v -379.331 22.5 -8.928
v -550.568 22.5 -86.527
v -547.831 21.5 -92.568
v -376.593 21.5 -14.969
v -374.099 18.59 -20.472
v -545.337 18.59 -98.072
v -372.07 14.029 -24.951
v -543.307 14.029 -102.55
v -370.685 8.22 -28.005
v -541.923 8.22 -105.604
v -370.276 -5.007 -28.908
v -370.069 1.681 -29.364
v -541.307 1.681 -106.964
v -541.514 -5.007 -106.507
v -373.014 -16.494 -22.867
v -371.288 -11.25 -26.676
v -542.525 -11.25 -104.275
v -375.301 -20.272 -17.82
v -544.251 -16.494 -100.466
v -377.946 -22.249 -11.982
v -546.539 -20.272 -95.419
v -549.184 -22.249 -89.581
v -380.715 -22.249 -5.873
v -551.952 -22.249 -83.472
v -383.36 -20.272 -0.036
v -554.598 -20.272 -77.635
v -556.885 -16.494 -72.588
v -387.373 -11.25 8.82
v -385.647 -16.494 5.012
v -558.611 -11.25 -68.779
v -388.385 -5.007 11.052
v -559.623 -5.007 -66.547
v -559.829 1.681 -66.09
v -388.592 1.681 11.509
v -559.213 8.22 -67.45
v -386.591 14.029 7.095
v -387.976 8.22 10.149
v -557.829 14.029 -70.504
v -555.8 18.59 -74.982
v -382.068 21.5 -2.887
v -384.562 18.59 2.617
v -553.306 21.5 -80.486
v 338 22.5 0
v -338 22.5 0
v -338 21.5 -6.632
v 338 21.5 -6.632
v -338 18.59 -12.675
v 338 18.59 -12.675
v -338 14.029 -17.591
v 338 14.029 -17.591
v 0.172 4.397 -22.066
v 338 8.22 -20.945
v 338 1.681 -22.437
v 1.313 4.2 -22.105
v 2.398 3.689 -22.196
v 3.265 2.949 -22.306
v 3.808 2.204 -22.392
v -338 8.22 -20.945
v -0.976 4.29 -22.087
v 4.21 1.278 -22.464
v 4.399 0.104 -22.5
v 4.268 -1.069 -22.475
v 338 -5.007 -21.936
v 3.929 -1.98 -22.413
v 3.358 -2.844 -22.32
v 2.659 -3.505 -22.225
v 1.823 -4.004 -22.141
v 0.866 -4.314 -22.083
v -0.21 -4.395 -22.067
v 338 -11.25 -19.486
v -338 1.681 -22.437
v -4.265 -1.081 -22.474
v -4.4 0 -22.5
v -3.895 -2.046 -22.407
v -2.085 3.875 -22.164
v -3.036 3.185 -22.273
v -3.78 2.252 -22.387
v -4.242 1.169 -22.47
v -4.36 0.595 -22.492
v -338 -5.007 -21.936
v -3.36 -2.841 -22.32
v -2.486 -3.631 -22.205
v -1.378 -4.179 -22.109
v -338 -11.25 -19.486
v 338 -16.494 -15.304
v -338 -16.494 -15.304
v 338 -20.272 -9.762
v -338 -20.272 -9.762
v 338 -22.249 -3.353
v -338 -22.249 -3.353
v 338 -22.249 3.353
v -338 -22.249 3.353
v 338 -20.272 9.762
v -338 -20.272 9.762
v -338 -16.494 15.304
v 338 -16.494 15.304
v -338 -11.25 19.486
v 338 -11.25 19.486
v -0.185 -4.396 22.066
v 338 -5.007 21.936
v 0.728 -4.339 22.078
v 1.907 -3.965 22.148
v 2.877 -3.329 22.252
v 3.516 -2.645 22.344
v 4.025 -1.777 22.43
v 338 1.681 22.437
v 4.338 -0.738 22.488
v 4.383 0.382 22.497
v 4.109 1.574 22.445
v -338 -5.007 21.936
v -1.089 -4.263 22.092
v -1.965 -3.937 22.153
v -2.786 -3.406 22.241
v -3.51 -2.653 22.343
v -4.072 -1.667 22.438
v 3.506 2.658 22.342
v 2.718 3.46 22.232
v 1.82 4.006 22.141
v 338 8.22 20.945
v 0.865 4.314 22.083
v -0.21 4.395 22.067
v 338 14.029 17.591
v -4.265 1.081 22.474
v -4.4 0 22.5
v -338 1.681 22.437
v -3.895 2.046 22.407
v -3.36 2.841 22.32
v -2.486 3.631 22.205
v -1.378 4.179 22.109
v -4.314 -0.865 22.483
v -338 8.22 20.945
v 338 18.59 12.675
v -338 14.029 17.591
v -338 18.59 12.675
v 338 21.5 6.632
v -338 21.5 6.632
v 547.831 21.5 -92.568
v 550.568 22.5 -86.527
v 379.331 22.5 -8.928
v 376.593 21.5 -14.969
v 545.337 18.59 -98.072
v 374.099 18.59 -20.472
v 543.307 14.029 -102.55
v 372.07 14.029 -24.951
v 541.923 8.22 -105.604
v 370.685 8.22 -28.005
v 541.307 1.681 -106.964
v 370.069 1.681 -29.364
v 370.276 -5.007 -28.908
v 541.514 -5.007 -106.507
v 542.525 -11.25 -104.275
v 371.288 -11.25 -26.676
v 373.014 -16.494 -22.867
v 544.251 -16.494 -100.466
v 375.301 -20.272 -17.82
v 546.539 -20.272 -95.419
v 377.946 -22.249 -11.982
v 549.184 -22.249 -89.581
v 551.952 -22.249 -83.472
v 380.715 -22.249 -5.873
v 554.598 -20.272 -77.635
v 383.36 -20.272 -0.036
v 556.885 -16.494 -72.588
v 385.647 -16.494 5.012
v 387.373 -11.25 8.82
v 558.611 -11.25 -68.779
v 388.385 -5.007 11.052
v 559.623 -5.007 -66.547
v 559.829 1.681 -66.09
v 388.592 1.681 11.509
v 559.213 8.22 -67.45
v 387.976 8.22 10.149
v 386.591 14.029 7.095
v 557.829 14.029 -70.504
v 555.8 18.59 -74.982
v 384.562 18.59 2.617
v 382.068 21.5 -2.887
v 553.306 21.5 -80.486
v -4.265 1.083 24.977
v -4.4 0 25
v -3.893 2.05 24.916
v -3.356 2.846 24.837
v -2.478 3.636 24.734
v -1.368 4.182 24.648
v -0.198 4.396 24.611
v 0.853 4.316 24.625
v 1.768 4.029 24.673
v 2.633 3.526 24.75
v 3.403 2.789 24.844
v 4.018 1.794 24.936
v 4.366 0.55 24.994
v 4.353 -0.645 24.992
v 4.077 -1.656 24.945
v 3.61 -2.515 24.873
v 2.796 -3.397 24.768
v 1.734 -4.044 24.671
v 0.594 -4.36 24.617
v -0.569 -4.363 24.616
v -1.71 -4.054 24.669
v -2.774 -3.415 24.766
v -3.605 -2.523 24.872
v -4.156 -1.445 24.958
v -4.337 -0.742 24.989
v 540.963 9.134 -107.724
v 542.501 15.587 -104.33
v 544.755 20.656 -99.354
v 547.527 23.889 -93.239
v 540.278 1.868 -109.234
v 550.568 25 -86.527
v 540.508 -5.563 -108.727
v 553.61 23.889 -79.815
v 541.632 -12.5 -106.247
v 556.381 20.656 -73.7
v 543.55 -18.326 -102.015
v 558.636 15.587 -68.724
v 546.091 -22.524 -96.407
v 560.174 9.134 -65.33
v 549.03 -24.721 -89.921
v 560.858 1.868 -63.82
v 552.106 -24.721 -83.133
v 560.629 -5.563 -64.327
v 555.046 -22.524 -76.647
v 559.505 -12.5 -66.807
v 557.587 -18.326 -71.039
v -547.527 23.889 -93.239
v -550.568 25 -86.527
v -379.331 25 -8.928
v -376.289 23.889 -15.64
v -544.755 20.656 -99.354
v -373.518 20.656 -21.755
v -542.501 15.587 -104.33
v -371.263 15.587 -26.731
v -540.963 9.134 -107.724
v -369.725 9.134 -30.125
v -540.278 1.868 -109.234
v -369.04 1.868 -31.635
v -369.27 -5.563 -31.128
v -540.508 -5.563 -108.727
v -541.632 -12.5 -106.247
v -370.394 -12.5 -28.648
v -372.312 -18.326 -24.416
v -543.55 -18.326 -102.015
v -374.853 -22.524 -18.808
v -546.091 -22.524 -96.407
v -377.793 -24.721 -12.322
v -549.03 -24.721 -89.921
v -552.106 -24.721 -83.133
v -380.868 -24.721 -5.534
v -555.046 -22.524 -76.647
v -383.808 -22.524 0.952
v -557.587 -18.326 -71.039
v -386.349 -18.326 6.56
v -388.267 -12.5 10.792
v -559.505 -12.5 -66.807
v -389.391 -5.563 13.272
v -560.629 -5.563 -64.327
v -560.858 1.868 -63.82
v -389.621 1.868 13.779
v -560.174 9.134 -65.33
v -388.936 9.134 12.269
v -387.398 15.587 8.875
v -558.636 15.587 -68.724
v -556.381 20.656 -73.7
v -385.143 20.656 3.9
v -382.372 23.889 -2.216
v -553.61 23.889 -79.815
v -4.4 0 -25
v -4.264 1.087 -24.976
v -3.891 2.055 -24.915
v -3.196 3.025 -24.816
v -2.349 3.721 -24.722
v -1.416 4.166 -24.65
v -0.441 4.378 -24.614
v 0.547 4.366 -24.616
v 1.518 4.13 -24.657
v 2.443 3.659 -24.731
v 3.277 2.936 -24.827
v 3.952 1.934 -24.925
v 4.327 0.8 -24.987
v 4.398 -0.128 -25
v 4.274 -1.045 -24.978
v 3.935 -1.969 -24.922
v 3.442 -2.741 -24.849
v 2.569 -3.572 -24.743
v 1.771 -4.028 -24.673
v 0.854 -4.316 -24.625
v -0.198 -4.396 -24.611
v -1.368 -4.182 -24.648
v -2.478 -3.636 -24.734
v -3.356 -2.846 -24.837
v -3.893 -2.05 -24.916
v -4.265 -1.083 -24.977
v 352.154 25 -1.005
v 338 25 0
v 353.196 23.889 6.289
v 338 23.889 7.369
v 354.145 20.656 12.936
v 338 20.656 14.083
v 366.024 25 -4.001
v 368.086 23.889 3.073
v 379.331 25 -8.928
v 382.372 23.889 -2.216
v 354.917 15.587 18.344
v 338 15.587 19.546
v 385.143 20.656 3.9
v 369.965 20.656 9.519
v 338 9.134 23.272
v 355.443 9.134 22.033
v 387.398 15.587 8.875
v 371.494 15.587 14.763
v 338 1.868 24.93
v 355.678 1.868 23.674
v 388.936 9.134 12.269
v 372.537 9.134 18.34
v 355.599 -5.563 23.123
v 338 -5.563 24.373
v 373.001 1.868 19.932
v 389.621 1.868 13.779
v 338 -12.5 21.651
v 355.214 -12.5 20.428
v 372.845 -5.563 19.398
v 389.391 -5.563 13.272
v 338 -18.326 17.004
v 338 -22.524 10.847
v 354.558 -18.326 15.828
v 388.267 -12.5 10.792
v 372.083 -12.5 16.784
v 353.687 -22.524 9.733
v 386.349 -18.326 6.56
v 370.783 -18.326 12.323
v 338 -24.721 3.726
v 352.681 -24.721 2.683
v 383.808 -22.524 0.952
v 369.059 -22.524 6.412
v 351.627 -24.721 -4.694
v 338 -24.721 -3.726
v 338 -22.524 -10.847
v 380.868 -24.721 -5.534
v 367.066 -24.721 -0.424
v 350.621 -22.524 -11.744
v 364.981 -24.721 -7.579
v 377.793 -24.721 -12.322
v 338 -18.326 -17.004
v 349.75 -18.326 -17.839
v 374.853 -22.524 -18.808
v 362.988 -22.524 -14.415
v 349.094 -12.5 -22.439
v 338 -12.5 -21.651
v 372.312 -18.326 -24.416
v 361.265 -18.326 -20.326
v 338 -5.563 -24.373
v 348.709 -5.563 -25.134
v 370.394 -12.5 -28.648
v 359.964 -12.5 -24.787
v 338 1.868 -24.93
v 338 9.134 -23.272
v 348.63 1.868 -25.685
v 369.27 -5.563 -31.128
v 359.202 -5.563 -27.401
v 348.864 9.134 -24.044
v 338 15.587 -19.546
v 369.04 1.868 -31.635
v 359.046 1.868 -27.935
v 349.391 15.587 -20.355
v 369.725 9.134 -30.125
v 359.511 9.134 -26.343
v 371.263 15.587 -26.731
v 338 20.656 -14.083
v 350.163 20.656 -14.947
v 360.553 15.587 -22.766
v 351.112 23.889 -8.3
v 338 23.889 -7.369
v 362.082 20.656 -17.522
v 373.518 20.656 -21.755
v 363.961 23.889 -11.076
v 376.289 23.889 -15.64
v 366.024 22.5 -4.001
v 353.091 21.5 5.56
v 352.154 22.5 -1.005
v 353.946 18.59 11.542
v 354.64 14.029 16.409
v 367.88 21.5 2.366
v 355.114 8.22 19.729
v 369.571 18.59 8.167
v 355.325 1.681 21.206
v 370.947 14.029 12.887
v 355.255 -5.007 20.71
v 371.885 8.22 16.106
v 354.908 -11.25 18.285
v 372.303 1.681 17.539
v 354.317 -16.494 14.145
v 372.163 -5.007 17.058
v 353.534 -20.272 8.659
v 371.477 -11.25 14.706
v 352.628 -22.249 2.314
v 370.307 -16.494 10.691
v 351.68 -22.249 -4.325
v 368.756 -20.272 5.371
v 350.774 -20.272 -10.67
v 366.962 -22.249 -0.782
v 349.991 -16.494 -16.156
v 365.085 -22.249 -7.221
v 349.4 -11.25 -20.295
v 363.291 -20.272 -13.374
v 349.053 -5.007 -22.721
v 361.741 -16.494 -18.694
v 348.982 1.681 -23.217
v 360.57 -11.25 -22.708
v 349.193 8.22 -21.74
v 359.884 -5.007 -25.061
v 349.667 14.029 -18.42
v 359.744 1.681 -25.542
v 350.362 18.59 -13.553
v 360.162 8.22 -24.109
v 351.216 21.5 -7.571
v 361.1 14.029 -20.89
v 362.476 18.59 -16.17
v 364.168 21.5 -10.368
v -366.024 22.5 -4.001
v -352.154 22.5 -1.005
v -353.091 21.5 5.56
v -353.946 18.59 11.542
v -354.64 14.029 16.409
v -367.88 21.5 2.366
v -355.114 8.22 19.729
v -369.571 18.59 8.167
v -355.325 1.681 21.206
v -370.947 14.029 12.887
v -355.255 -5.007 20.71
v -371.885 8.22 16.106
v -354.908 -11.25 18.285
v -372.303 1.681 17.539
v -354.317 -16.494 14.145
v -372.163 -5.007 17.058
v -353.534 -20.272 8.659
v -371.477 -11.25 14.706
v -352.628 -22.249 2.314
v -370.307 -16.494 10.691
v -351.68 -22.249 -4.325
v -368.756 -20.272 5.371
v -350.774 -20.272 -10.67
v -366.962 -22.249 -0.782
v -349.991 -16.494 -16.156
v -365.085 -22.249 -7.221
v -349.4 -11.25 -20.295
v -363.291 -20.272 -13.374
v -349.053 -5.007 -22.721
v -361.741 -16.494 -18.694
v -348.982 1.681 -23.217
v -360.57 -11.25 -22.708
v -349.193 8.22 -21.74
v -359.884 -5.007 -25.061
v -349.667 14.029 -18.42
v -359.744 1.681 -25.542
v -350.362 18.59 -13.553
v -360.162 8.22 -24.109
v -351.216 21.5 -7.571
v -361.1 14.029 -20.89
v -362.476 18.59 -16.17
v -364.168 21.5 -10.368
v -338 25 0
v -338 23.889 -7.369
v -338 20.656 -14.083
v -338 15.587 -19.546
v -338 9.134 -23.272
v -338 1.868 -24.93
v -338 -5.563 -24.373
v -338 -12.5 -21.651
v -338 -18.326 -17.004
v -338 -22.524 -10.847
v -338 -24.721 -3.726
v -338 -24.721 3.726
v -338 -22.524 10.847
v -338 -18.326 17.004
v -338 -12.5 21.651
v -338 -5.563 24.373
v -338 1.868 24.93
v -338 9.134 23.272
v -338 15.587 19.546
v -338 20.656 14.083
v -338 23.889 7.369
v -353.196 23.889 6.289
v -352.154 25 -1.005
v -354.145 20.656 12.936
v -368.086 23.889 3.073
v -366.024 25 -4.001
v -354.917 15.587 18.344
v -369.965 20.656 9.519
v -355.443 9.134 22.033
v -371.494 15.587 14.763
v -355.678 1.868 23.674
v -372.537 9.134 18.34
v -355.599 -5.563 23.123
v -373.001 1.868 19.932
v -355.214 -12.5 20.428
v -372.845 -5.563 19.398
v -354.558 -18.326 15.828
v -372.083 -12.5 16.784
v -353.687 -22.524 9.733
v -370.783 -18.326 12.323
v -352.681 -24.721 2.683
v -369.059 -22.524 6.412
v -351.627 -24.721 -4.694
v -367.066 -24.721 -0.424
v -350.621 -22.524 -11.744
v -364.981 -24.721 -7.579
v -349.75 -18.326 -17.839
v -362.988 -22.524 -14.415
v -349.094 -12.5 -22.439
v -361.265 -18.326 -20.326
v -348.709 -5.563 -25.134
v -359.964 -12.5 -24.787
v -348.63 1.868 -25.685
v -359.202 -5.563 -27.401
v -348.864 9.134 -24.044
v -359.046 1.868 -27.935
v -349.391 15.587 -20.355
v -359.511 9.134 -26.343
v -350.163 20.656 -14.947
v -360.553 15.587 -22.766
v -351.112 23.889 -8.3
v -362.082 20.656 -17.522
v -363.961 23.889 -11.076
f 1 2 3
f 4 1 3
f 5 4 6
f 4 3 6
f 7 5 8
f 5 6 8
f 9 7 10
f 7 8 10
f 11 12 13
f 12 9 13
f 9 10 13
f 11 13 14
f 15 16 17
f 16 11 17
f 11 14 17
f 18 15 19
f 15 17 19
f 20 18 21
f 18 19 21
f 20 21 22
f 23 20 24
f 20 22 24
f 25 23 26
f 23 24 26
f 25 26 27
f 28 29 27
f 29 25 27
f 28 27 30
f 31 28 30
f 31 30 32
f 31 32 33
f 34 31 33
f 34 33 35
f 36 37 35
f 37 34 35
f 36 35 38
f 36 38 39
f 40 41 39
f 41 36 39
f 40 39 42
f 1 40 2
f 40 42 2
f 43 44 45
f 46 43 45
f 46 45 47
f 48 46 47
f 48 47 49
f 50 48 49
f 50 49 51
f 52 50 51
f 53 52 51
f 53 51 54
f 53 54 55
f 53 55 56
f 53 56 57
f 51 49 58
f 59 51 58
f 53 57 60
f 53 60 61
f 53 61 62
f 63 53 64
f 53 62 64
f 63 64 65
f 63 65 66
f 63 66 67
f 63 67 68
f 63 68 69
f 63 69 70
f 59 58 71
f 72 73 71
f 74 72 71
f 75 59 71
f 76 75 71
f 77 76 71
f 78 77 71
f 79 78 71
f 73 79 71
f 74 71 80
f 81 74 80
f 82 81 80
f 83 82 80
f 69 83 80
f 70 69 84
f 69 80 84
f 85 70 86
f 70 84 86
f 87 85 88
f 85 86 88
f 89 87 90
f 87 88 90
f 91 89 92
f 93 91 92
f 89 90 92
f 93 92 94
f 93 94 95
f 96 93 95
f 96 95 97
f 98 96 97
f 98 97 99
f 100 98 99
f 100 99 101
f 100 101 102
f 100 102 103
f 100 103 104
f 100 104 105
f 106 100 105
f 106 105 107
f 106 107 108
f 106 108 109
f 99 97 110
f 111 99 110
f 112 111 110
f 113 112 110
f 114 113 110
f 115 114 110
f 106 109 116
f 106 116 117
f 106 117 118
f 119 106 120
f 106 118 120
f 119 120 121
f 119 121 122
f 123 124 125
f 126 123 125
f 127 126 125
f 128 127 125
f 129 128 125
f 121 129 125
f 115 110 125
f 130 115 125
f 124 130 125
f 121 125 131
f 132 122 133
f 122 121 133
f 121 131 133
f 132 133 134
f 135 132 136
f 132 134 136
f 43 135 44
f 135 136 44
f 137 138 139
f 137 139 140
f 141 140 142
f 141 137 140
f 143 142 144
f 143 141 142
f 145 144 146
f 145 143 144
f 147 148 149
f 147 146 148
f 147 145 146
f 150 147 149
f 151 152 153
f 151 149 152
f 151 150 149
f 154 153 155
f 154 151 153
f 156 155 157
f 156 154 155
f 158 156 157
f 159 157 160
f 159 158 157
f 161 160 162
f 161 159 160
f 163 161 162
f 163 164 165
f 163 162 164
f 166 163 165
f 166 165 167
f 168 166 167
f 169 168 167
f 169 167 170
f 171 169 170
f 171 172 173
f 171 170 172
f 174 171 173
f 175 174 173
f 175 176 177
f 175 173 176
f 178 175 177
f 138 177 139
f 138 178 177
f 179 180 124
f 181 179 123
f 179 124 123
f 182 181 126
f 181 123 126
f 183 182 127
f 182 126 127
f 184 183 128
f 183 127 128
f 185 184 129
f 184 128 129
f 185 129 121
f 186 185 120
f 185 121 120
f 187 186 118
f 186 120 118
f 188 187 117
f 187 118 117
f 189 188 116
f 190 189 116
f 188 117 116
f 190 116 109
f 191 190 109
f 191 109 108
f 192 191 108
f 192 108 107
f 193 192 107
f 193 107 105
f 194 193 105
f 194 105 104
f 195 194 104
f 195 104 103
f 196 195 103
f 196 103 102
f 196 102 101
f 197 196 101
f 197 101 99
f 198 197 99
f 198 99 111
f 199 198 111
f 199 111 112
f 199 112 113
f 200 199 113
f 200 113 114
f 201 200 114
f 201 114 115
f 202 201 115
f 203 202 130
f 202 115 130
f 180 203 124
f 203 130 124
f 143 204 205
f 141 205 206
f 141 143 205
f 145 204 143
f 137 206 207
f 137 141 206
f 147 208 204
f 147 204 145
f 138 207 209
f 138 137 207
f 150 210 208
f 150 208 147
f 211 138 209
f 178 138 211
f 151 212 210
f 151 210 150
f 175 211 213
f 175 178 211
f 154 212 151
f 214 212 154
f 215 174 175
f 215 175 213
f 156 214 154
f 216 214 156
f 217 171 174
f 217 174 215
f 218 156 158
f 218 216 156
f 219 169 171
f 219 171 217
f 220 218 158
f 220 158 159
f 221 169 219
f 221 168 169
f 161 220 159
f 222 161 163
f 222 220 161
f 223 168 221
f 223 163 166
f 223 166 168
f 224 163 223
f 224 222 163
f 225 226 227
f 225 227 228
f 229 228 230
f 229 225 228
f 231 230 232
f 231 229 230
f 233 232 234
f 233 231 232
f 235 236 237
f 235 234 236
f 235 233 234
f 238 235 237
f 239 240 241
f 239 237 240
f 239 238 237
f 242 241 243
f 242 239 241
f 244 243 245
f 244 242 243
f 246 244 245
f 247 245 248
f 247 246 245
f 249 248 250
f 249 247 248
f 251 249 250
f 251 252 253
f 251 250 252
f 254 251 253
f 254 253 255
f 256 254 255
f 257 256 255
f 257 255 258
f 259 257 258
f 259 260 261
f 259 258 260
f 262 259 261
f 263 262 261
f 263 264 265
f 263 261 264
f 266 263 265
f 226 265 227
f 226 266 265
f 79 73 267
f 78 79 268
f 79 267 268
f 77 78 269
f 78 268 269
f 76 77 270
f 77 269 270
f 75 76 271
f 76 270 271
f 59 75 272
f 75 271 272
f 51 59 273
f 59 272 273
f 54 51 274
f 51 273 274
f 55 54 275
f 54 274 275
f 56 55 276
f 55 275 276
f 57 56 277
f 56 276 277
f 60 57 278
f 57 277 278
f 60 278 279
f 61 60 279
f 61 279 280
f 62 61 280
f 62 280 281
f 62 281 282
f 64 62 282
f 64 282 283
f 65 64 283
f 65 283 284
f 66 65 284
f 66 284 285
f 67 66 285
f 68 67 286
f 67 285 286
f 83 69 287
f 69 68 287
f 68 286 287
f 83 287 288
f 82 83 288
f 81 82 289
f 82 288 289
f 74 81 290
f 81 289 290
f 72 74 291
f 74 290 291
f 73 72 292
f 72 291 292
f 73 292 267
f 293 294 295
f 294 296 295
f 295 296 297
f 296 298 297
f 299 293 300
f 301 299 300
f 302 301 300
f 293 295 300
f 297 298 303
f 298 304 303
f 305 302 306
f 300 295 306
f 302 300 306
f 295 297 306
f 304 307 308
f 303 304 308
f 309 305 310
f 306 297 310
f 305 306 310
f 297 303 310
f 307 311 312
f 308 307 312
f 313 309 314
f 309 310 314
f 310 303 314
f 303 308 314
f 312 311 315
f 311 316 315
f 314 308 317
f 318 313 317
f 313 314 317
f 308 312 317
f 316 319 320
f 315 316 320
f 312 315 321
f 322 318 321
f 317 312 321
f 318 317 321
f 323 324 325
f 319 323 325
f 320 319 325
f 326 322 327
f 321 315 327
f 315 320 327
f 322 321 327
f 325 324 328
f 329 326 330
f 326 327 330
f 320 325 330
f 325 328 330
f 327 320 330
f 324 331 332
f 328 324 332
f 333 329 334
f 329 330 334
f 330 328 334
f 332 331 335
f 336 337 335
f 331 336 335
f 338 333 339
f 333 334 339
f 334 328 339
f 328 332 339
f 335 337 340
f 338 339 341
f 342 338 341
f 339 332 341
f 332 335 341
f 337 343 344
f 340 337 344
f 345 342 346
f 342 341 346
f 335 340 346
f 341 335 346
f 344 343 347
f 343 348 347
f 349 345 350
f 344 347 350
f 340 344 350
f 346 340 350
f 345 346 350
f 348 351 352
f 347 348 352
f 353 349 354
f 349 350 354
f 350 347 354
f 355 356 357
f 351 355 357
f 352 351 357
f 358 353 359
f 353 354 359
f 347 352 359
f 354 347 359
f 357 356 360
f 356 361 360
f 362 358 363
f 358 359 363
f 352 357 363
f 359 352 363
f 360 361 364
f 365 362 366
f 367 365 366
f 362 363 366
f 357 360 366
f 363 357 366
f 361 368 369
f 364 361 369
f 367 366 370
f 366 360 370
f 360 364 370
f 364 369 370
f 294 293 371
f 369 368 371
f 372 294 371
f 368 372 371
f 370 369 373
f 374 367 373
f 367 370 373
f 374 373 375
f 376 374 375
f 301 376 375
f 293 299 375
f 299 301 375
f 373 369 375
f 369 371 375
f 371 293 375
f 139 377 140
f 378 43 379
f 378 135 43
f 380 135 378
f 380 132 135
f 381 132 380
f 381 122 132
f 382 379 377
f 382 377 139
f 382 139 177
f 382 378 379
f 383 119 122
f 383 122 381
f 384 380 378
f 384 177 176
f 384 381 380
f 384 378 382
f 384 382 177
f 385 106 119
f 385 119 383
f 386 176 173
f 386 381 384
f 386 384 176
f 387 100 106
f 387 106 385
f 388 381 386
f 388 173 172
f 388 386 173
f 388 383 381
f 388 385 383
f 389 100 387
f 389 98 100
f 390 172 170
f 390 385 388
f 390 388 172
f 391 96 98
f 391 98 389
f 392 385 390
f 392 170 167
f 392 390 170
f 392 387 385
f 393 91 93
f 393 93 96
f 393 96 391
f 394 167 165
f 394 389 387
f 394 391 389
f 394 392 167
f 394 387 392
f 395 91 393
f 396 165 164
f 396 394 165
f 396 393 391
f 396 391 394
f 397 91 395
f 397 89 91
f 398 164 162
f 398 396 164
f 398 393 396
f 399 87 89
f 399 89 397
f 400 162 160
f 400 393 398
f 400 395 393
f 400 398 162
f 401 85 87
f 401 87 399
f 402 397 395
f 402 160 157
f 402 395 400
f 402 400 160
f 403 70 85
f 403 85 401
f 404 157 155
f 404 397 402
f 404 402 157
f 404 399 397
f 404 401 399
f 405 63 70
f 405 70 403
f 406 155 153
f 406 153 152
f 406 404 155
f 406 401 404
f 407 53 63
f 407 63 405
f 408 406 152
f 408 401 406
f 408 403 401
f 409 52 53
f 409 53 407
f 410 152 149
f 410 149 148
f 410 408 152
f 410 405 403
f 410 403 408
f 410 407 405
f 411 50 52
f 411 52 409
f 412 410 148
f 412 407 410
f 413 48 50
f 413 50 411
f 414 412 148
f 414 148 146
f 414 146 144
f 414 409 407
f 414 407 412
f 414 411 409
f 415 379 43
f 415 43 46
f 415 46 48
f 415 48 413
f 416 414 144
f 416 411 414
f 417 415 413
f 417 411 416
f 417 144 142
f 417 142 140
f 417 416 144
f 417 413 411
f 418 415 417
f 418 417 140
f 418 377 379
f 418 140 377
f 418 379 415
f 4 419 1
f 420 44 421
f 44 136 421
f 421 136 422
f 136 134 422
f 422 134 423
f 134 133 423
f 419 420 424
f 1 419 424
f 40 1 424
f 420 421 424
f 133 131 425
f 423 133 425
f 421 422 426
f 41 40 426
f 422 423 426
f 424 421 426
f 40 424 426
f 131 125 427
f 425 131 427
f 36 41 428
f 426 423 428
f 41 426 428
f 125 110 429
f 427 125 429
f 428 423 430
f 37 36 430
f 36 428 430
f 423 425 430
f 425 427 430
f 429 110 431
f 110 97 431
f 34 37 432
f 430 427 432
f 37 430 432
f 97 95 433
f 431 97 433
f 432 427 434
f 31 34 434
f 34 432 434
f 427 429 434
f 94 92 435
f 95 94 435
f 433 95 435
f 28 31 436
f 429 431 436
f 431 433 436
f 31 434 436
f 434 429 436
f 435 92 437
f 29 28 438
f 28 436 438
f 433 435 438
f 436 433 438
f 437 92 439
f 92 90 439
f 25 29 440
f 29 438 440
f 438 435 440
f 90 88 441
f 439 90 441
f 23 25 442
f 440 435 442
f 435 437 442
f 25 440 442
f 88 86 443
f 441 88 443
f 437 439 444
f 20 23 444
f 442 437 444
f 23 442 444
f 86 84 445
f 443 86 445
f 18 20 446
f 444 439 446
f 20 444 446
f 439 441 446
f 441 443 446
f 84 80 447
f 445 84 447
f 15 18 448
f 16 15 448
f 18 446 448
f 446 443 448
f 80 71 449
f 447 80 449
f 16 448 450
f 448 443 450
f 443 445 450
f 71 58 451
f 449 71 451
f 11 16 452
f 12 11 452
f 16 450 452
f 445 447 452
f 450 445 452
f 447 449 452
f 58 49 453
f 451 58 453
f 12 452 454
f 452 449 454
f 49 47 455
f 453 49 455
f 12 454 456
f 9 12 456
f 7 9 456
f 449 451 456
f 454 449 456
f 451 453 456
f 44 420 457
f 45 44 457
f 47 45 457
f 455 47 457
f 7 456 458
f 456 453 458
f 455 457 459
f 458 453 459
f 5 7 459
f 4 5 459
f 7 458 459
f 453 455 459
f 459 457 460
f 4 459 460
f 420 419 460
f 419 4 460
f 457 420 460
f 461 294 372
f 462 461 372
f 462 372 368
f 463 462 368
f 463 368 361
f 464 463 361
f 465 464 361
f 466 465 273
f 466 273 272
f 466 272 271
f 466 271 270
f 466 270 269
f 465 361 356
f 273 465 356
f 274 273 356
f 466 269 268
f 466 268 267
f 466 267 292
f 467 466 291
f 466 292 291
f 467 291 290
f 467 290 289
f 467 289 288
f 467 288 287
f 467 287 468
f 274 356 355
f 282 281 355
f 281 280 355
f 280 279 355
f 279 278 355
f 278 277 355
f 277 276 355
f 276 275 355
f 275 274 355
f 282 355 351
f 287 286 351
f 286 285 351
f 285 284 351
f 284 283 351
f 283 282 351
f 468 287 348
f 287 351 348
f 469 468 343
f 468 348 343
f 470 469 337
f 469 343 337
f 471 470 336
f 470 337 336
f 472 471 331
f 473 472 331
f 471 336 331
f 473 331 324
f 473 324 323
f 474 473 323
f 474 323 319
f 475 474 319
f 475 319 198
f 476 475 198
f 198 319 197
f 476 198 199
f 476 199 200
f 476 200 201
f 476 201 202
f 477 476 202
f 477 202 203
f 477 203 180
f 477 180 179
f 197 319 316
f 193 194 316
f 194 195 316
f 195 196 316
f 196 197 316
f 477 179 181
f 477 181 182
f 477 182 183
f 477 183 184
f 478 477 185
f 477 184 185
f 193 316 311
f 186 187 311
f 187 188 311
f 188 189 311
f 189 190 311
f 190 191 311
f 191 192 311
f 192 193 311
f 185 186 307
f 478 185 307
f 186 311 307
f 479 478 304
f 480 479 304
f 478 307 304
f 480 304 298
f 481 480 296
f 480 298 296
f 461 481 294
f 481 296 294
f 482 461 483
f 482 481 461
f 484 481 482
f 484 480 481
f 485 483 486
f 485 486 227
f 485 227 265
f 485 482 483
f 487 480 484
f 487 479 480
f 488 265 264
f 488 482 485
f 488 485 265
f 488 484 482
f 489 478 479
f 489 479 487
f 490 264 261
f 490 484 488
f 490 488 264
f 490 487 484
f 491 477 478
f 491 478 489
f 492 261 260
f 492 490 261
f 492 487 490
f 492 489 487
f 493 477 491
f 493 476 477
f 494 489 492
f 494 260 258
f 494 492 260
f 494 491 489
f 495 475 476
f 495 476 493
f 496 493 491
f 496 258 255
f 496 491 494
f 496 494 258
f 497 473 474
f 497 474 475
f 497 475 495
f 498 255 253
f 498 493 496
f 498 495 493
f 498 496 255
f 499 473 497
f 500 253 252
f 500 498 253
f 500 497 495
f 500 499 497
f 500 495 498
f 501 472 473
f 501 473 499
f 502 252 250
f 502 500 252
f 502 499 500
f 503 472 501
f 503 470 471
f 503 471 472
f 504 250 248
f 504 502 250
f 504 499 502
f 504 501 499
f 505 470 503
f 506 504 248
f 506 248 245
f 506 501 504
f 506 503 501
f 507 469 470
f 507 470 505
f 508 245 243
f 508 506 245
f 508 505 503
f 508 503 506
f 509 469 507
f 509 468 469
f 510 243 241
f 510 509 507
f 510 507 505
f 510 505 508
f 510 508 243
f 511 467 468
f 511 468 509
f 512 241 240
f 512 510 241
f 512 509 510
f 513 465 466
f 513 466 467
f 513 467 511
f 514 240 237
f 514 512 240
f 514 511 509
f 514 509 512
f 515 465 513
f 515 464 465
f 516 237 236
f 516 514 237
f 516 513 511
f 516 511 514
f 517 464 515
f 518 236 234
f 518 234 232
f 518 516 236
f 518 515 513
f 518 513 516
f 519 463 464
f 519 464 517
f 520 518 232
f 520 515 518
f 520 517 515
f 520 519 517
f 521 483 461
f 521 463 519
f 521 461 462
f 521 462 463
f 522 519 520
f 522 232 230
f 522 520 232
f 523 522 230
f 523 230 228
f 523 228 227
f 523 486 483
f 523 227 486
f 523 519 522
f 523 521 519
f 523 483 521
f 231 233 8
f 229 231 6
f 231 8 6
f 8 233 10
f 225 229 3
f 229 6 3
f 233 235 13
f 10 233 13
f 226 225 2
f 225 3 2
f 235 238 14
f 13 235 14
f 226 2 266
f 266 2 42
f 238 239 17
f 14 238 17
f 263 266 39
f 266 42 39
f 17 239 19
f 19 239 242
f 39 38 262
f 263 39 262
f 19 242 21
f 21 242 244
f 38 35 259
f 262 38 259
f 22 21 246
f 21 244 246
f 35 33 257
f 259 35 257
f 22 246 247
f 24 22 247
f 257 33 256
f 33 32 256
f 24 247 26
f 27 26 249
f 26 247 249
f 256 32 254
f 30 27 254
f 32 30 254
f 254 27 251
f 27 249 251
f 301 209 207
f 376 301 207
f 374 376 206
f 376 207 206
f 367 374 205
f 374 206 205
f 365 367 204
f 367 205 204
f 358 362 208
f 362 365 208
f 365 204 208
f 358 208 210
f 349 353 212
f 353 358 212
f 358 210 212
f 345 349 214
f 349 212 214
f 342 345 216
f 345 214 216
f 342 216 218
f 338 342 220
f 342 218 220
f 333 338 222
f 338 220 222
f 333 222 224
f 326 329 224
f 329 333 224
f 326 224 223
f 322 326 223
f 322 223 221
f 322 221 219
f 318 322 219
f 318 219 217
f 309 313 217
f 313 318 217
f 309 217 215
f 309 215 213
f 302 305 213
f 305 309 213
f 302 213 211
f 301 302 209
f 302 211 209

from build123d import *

# Parameters (mm, degrees)
F1_R   = 25
F1_R_2 = 22.5
F6_D   = 8.8


with BuildPart() as f2:
    # F2: sweep along a path in F0
    with BuildLine(Plane.XZ) as f2_path:
        Line((0, 24.8682312667), (-338, 24.8682312667))
        ThreePointArc((-338, 24.8682312667), (-364.3925829493, 22.0501921499), (-389.5951606003, 13.723136311))
        Line((-389.5951606003, 13.723136311), (-560.8329377868, -63.8759852319))
    # F1 (on Right) → F2 (sweep)
    with BuildSketch(Plane.YZ):
        Circle(F1_R)
        Circle(F1_R_2, mode=Mode.SUBTRACT)
    sweep(path=f2_path.line)

    # F3: F2 across plane


with BuildPart() as f2_1:
    add(f2.part)
    add(f2.part.mirror(Plane.YZ))

    # F6 (through all)
    with Locations(Plane.XY.offset(25)):
        with Locations((0, 0)):
            Hole(F6_D / 2)


solid = f2_1.part
